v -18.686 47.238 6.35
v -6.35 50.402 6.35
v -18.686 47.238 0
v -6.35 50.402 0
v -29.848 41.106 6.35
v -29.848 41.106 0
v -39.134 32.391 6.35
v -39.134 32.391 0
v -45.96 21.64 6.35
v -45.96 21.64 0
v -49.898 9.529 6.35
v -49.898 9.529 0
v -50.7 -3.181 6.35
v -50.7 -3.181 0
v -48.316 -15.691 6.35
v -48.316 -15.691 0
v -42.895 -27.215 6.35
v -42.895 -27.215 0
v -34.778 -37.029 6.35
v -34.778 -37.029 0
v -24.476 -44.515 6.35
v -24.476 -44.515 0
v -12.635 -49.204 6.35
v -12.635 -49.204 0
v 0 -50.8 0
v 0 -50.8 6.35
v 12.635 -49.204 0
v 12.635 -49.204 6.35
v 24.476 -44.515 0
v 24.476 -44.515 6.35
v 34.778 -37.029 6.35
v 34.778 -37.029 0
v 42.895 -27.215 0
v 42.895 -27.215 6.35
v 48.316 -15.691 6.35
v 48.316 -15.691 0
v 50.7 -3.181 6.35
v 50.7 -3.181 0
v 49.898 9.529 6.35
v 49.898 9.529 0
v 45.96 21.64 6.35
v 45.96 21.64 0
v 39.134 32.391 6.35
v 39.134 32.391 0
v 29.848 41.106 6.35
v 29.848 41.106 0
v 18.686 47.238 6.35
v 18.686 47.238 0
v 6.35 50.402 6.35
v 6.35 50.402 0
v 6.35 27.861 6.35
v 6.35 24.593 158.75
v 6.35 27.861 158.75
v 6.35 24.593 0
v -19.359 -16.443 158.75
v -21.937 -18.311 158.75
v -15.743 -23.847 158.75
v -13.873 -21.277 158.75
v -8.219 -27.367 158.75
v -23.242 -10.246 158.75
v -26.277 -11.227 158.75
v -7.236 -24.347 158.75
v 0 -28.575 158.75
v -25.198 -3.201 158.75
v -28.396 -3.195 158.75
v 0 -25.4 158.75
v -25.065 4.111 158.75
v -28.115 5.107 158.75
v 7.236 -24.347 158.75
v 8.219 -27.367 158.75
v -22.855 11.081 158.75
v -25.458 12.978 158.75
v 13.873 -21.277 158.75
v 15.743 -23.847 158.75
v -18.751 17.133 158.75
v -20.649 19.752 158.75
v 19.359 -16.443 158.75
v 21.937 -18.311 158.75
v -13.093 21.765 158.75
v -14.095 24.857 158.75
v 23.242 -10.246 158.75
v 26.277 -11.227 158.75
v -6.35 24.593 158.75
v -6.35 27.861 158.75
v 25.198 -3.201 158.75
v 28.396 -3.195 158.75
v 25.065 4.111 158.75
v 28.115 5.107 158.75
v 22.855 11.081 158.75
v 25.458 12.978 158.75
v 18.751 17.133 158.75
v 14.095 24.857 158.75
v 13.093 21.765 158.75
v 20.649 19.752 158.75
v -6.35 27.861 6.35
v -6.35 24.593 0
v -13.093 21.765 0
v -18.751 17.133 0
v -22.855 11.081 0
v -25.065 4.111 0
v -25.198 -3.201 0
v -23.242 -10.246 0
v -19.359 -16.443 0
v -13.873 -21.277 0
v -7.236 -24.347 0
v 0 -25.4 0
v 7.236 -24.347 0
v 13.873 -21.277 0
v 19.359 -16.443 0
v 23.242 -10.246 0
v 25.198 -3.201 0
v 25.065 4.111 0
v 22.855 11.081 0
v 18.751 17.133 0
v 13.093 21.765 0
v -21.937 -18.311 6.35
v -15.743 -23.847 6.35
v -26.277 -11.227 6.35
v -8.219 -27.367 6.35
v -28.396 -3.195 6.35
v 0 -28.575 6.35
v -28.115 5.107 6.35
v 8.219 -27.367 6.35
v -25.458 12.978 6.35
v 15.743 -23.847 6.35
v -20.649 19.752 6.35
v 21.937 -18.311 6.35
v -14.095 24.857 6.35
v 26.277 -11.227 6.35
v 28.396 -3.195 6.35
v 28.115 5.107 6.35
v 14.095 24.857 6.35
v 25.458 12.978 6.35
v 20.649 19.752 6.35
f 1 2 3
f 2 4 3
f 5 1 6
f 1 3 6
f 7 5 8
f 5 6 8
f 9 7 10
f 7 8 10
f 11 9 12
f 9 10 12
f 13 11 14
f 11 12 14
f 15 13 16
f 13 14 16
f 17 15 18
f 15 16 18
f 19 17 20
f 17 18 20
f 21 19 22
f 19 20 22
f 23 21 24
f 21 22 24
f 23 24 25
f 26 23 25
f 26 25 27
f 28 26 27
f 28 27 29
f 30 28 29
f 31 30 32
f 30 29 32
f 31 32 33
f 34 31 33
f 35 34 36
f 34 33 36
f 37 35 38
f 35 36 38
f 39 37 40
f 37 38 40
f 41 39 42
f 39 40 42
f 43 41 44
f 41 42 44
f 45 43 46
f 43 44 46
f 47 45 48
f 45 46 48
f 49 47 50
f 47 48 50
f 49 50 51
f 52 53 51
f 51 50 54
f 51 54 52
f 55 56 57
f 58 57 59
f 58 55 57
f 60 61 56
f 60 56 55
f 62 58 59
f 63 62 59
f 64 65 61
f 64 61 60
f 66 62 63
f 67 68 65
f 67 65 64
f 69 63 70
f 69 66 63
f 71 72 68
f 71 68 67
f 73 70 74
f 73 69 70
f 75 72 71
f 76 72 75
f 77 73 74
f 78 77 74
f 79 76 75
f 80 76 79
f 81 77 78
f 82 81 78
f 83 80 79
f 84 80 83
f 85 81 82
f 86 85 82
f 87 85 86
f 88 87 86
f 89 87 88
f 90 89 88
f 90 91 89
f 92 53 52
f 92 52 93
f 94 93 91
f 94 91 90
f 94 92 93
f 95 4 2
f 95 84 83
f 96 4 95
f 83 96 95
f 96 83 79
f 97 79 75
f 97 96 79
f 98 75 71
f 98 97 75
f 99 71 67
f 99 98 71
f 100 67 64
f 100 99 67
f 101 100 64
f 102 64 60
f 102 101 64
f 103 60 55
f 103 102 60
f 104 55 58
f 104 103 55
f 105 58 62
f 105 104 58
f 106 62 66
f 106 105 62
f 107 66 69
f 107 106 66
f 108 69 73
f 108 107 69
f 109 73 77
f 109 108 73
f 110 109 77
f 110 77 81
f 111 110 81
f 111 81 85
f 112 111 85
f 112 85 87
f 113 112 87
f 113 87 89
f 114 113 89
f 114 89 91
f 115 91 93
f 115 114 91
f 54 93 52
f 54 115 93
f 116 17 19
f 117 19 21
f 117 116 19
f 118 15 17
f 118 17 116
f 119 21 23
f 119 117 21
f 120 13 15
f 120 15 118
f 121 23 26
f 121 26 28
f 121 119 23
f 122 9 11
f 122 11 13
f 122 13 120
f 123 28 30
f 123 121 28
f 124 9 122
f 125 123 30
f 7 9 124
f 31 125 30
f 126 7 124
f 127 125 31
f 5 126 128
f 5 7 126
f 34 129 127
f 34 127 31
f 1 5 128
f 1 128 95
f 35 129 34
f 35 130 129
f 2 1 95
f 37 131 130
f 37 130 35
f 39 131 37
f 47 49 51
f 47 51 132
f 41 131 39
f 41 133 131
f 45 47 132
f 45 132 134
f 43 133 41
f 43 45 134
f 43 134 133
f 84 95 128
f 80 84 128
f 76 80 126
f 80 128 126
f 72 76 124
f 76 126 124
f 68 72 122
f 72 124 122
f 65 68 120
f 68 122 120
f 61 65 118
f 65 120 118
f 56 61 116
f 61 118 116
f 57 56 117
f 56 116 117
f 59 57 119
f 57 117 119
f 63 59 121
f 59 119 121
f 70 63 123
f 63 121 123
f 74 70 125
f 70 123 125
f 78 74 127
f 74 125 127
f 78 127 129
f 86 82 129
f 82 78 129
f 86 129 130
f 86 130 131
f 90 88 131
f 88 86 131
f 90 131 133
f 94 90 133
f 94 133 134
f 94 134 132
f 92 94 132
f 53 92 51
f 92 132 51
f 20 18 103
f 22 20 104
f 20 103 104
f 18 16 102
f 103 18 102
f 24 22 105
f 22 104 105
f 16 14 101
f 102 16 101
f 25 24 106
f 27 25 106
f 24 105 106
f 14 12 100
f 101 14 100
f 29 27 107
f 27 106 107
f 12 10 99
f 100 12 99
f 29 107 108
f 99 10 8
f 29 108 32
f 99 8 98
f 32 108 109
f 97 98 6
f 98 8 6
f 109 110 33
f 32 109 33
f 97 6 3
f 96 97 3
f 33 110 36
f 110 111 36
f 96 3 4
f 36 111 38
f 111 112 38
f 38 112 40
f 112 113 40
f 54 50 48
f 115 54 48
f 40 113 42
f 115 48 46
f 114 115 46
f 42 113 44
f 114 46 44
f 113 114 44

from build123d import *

# Parameters (mm, degrees)
F0_R     = 50.8
F0_R_2   = 25.4
F1_DEPTH = 6.35
F2_R     = 28.575
F2_R_2   = 25.4
F3_DEPTH = 152.4
F4_W     = 12.7
F4_H     = 51.4328
F5_DEPTH = 158.751


with BuildPart() as f1:
    # F0 (on Top) → F1 (new body)
    with BuildSketch(Plane.XY):
        Circle(F0_R)
        Circle(F0_R_2, mode=Mode.SUBTRACT)
    extrude(amount=F1_DEPTH)

    # F2 (on face) → F3 (join)
    with BuildSketch(Plane.XY.offset(6.35)):
        Circle(F2_R)
        Circle(F2_R_2, mode=Mode.SUBTRACT)
    extrude(amount=F3_DEPTH)

    # F4 (on face) → F5 (cut, through all)
    with BuildSketch(Plane(origin=(0, 0, 0), x_dir=(1, 0, 0), z_dir=(0, 0, -1))):
        with Locations((0, -39.142372)):
            Rectangle(F4_W, F4_H)
    extrude(amount=-F5_DEPTH, mode=Mode.SUBTRACT)


solid = f1.part
